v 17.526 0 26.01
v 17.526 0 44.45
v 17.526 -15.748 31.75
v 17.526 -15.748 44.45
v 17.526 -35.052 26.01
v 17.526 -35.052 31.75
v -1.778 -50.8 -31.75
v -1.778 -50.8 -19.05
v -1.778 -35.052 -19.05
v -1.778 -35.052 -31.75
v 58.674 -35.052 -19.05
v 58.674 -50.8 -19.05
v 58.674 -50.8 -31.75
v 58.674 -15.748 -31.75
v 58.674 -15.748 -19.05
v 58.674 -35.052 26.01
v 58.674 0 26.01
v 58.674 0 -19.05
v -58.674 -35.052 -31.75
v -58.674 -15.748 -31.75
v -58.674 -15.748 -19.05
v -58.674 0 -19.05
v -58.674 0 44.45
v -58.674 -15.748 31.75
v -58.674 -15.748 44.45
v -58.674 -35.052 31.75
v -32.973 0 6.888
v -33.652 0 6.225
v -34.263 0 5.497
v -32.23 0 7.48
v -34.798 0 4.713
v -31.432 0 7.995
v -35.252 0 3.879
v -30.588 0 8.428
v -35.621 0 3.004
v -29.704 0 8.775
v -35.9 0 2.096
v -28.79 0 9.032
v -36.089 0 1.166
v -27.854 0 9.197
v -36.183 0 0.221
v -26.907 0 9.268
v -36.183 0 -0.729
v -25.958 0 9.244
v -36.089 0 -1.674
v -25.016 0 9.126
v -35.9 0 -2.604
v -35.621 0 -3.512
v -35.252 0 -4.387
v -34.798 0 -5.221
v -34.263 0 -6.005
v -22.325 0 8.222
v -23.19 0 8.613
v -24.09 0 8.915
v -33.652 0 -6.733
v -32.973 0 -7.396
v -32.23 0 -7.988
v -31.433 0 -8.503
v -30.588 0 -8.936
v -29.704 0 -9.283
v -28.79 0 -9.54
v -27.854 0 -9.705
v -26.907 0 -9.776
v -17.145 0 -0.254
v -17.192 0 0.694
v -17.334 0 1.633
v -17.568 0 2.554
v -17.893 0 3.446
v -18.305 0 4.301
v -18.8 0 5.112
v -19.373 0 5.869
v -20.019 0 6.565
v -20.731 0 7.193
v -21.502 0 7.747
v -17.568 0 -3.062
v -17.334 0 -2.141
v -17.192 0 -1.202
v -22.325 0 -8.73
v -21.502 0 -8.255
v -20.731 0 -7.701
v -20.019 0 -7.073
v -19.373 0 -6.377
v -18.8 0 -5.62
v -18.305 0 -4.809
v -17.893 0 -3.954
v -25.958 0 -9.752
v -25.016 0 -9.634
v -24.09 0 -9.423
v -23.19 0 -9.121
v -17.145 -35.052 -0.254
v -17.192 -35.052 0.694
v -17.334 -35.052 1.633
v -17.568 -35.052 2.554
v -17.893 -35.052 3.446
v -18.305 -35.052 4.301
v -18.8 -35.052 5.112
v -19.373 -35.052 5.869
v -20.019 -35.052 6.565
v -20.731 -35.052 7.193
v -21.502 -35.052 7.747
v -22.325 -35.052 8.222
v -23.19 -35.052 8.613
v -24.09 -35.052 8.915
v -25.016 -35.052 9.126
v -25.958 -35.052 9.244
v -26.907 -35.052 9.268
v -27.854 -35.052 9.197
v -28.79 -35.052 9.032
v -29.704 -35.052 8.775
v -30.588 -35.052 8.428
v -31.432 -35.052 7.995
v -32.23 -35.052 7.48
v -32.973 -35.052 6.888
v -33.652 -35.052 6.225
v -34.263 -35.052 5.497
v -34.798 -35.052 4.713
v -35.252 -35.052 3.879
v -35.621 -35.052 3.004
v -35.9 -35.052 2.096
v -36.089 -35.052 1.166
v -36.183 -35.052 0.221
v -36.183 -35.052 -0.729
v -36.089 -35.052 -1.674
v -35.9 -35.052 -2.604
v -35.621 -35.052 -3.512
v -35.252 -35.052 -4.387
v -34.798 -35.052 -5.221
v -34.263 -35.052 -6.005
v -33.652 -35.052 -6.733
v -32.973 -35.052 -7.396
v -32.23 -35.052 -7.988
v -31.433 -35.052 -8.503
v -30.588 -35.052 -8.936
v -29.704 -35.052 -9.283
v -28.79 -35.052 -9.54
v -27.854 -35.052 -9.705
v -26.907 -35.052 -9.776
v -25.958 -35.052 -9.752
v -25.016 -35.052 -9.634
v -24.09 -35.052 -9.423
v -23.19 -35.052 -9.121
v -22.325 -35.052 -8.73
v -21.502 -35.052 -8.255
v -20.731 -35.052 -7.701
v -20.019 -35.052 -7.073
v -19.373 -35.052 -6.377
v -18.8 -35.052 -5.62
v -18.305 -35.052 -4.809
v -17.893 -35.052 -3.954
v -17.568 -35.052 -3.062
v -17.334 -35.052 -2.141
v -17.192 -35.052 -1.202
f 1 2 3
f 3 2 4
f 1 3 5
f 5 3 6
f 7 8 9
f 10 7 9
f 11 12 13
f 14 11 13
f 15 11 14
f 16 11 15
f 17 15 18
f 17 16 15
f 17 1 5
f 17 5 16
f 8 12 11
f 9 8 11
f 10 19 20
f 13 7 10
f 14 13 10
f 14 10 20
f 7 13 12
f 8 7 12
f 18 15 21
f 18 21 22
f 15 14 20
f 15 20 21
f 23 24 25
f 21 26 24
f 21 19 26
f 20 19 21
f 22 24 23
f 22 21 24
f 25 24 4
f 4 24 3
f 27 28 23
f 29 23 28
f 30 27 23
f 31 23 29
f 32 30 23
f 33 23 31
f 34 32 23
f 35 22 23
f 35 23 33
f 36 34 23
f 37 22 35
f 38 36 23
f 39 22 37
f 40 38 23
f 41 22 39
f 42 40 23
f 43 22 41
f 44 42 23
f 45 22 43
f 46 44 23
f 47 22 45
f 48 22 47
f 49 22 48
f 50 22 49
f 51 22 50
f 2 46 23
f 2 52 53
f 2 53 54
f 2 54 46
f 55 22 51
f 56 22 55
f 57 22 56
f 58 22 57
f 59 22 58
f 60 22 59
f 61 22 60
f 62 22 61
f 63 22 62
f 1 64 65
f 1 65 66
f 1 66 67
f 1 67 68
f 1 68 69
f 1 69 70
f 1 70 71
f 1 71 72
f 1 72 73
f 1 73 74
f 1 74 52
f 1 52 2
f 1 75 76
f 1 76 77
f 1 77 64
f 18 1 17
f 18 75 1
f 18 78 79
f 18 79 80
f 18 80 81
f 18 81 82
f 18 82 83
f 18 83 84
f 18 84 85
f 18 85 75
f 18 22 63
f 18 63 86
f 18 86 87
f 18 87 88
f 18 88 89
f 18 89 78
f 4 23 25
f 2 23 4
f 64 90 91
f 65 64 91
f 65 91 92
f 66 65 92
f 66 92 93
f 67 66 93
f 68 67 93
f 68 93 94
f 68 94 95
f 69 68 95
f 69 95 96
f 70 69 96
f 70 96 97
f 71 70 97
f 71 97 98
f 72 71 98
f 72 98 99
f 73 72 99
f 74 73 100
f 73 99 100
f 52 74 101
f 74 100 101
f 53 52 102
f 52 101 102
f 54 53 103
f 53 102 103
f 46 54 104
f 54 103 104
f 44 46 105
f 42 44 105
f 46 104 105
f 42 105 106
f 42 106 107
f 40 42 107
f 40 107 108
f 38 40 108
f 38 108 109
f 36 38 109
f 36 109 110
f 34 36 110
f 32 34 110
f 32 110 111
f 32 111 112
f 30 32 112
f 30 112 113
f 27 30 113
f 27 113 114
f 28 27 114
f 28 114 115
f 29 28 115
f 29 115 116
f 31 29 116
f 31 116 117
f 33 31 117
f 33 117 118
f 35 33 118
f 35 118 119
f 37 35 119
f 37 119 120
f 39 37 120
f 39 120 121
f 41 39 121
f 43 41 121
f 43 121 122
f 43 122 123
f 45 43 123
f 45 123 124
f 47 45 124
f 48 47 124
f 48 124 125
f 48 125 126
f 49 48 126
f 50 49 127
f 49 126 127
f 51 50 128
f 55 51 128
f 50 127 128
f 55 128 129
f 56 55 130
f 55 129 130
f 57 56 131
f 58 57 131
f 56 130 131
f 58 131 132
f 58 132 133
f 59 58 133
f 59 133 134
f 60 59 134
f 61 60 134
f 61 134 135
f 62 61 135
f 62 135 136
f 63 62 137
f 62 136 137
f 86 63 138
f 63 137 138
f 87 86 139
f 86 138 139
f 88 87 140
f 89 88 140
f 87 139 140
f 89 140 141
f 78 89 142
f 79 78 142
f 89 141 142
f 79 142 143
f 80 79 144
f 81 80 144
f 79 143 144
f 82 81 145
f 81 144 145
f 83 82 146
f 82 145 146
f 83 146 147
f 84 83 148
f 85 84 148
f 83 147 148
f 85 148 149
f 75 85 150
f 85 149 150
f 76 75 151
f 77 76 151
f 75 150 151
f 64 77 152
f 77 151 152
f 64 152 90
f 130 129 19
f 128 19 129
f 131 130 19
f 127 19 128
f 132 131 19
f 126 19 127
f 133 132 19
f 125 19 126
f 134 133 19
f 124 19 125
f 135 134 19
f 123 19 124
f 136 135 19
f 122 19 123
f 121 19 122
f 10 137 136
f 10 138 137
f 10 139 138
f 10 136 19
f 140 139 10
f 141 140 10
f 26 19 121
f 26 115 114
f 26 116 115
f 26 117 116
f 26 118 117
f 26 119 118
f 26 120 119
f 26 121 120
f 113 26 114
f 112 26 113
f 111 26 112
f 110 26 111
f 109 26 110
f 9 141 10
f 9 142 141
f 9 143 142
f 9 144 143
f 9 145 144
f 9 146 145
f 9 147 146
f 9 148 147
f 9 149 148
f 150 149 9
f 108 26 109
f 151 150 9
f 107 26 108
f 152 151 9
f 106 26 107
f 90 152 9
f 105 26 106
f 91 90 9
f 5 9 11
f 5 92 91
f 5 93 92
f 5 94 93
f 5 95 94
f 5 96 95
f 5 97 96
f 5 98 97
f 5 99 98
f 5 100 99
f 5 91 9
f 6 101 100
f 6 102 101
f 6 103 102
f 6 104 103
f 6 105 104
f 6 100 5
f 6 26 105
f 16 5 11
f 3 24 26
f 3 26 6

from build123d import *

# Parameters (mm, degrees)
F0_W      = 117.348
F0_H      = 63.5
F1_DEPTH  = 35.052
F2_W      = 117.348
F2_H      = 15.748
F3_DEPTH  = 12.7
F4_W      = 41.148
F4_H      = 15.748
F4_H_2    = 19.304
F5_DEPTH  = 18.4404
F6_W      = 15.748
F6_H      = 12.7
F7_DEPTH  = 117.349
F8_W      = 15.748
F8_H      = 12.7
F9_DEPTH  = 60.452
F10_R     = 9.525
F11_DEPTH = 35.053


with BuildPart() as f1:
    # F0 (on Front) → F1 (new body)
    with BuildSketch(Plane.XZ):
        Rectangle(F0_W, F0_H)
    extrude(amount=F1_DEPTH)

    # F2 (on face) → F3 (join)
    with BuildSketch(Plane.XY.offset(31.75)):
        with Locations((0, -7.874)):
            Rectangle(F2_W, F2_H)
    extrude(amount=F3_DEPTH)

    # F4 (on face) → F5 (cut)
    with BuildSketch(Plane.XY.offset(44.45)):
        with Locations((38.1, -7.874)):
            Rectangle(F4_W, F4_H)
        with Locations((38.1, -25.4)):
            Rectangle(F4_W, F4_H_2)
    extrude(amount=-F5_DEPTH, mode=Mode.SUBTRACT)

    # F6 (on face) → F7 (cut, through all)
    with BuildSketch(Plane.YZ.offset(58.674)):
        with Locations((-7.874, -25.4)):
            Rectangle(F6_W, F6_H)
    extrude(amount=-F7_DEPTH, mode=Mode.SUBTRACT)

    # F8 (on face) → F9 (join)
    with BuildSketch(Plane.YZ.offset(58.674)):
        with Locations((-42.926, -25.4)):
            Rectangle(F8_W, F8_H)
    extrude(amount=-F9_DEPTH)

    # F10 (on face) → F11 (cut, through all)
    with BuildSketch(Plane.XZ.offset(35.052)):
        with Locations((-26.67, -0.254)):
            Circle(F10_R)
    extrude(amount=-F11_DEPTH, mode=Mode.SUBTRACT)


solid = f1.part
